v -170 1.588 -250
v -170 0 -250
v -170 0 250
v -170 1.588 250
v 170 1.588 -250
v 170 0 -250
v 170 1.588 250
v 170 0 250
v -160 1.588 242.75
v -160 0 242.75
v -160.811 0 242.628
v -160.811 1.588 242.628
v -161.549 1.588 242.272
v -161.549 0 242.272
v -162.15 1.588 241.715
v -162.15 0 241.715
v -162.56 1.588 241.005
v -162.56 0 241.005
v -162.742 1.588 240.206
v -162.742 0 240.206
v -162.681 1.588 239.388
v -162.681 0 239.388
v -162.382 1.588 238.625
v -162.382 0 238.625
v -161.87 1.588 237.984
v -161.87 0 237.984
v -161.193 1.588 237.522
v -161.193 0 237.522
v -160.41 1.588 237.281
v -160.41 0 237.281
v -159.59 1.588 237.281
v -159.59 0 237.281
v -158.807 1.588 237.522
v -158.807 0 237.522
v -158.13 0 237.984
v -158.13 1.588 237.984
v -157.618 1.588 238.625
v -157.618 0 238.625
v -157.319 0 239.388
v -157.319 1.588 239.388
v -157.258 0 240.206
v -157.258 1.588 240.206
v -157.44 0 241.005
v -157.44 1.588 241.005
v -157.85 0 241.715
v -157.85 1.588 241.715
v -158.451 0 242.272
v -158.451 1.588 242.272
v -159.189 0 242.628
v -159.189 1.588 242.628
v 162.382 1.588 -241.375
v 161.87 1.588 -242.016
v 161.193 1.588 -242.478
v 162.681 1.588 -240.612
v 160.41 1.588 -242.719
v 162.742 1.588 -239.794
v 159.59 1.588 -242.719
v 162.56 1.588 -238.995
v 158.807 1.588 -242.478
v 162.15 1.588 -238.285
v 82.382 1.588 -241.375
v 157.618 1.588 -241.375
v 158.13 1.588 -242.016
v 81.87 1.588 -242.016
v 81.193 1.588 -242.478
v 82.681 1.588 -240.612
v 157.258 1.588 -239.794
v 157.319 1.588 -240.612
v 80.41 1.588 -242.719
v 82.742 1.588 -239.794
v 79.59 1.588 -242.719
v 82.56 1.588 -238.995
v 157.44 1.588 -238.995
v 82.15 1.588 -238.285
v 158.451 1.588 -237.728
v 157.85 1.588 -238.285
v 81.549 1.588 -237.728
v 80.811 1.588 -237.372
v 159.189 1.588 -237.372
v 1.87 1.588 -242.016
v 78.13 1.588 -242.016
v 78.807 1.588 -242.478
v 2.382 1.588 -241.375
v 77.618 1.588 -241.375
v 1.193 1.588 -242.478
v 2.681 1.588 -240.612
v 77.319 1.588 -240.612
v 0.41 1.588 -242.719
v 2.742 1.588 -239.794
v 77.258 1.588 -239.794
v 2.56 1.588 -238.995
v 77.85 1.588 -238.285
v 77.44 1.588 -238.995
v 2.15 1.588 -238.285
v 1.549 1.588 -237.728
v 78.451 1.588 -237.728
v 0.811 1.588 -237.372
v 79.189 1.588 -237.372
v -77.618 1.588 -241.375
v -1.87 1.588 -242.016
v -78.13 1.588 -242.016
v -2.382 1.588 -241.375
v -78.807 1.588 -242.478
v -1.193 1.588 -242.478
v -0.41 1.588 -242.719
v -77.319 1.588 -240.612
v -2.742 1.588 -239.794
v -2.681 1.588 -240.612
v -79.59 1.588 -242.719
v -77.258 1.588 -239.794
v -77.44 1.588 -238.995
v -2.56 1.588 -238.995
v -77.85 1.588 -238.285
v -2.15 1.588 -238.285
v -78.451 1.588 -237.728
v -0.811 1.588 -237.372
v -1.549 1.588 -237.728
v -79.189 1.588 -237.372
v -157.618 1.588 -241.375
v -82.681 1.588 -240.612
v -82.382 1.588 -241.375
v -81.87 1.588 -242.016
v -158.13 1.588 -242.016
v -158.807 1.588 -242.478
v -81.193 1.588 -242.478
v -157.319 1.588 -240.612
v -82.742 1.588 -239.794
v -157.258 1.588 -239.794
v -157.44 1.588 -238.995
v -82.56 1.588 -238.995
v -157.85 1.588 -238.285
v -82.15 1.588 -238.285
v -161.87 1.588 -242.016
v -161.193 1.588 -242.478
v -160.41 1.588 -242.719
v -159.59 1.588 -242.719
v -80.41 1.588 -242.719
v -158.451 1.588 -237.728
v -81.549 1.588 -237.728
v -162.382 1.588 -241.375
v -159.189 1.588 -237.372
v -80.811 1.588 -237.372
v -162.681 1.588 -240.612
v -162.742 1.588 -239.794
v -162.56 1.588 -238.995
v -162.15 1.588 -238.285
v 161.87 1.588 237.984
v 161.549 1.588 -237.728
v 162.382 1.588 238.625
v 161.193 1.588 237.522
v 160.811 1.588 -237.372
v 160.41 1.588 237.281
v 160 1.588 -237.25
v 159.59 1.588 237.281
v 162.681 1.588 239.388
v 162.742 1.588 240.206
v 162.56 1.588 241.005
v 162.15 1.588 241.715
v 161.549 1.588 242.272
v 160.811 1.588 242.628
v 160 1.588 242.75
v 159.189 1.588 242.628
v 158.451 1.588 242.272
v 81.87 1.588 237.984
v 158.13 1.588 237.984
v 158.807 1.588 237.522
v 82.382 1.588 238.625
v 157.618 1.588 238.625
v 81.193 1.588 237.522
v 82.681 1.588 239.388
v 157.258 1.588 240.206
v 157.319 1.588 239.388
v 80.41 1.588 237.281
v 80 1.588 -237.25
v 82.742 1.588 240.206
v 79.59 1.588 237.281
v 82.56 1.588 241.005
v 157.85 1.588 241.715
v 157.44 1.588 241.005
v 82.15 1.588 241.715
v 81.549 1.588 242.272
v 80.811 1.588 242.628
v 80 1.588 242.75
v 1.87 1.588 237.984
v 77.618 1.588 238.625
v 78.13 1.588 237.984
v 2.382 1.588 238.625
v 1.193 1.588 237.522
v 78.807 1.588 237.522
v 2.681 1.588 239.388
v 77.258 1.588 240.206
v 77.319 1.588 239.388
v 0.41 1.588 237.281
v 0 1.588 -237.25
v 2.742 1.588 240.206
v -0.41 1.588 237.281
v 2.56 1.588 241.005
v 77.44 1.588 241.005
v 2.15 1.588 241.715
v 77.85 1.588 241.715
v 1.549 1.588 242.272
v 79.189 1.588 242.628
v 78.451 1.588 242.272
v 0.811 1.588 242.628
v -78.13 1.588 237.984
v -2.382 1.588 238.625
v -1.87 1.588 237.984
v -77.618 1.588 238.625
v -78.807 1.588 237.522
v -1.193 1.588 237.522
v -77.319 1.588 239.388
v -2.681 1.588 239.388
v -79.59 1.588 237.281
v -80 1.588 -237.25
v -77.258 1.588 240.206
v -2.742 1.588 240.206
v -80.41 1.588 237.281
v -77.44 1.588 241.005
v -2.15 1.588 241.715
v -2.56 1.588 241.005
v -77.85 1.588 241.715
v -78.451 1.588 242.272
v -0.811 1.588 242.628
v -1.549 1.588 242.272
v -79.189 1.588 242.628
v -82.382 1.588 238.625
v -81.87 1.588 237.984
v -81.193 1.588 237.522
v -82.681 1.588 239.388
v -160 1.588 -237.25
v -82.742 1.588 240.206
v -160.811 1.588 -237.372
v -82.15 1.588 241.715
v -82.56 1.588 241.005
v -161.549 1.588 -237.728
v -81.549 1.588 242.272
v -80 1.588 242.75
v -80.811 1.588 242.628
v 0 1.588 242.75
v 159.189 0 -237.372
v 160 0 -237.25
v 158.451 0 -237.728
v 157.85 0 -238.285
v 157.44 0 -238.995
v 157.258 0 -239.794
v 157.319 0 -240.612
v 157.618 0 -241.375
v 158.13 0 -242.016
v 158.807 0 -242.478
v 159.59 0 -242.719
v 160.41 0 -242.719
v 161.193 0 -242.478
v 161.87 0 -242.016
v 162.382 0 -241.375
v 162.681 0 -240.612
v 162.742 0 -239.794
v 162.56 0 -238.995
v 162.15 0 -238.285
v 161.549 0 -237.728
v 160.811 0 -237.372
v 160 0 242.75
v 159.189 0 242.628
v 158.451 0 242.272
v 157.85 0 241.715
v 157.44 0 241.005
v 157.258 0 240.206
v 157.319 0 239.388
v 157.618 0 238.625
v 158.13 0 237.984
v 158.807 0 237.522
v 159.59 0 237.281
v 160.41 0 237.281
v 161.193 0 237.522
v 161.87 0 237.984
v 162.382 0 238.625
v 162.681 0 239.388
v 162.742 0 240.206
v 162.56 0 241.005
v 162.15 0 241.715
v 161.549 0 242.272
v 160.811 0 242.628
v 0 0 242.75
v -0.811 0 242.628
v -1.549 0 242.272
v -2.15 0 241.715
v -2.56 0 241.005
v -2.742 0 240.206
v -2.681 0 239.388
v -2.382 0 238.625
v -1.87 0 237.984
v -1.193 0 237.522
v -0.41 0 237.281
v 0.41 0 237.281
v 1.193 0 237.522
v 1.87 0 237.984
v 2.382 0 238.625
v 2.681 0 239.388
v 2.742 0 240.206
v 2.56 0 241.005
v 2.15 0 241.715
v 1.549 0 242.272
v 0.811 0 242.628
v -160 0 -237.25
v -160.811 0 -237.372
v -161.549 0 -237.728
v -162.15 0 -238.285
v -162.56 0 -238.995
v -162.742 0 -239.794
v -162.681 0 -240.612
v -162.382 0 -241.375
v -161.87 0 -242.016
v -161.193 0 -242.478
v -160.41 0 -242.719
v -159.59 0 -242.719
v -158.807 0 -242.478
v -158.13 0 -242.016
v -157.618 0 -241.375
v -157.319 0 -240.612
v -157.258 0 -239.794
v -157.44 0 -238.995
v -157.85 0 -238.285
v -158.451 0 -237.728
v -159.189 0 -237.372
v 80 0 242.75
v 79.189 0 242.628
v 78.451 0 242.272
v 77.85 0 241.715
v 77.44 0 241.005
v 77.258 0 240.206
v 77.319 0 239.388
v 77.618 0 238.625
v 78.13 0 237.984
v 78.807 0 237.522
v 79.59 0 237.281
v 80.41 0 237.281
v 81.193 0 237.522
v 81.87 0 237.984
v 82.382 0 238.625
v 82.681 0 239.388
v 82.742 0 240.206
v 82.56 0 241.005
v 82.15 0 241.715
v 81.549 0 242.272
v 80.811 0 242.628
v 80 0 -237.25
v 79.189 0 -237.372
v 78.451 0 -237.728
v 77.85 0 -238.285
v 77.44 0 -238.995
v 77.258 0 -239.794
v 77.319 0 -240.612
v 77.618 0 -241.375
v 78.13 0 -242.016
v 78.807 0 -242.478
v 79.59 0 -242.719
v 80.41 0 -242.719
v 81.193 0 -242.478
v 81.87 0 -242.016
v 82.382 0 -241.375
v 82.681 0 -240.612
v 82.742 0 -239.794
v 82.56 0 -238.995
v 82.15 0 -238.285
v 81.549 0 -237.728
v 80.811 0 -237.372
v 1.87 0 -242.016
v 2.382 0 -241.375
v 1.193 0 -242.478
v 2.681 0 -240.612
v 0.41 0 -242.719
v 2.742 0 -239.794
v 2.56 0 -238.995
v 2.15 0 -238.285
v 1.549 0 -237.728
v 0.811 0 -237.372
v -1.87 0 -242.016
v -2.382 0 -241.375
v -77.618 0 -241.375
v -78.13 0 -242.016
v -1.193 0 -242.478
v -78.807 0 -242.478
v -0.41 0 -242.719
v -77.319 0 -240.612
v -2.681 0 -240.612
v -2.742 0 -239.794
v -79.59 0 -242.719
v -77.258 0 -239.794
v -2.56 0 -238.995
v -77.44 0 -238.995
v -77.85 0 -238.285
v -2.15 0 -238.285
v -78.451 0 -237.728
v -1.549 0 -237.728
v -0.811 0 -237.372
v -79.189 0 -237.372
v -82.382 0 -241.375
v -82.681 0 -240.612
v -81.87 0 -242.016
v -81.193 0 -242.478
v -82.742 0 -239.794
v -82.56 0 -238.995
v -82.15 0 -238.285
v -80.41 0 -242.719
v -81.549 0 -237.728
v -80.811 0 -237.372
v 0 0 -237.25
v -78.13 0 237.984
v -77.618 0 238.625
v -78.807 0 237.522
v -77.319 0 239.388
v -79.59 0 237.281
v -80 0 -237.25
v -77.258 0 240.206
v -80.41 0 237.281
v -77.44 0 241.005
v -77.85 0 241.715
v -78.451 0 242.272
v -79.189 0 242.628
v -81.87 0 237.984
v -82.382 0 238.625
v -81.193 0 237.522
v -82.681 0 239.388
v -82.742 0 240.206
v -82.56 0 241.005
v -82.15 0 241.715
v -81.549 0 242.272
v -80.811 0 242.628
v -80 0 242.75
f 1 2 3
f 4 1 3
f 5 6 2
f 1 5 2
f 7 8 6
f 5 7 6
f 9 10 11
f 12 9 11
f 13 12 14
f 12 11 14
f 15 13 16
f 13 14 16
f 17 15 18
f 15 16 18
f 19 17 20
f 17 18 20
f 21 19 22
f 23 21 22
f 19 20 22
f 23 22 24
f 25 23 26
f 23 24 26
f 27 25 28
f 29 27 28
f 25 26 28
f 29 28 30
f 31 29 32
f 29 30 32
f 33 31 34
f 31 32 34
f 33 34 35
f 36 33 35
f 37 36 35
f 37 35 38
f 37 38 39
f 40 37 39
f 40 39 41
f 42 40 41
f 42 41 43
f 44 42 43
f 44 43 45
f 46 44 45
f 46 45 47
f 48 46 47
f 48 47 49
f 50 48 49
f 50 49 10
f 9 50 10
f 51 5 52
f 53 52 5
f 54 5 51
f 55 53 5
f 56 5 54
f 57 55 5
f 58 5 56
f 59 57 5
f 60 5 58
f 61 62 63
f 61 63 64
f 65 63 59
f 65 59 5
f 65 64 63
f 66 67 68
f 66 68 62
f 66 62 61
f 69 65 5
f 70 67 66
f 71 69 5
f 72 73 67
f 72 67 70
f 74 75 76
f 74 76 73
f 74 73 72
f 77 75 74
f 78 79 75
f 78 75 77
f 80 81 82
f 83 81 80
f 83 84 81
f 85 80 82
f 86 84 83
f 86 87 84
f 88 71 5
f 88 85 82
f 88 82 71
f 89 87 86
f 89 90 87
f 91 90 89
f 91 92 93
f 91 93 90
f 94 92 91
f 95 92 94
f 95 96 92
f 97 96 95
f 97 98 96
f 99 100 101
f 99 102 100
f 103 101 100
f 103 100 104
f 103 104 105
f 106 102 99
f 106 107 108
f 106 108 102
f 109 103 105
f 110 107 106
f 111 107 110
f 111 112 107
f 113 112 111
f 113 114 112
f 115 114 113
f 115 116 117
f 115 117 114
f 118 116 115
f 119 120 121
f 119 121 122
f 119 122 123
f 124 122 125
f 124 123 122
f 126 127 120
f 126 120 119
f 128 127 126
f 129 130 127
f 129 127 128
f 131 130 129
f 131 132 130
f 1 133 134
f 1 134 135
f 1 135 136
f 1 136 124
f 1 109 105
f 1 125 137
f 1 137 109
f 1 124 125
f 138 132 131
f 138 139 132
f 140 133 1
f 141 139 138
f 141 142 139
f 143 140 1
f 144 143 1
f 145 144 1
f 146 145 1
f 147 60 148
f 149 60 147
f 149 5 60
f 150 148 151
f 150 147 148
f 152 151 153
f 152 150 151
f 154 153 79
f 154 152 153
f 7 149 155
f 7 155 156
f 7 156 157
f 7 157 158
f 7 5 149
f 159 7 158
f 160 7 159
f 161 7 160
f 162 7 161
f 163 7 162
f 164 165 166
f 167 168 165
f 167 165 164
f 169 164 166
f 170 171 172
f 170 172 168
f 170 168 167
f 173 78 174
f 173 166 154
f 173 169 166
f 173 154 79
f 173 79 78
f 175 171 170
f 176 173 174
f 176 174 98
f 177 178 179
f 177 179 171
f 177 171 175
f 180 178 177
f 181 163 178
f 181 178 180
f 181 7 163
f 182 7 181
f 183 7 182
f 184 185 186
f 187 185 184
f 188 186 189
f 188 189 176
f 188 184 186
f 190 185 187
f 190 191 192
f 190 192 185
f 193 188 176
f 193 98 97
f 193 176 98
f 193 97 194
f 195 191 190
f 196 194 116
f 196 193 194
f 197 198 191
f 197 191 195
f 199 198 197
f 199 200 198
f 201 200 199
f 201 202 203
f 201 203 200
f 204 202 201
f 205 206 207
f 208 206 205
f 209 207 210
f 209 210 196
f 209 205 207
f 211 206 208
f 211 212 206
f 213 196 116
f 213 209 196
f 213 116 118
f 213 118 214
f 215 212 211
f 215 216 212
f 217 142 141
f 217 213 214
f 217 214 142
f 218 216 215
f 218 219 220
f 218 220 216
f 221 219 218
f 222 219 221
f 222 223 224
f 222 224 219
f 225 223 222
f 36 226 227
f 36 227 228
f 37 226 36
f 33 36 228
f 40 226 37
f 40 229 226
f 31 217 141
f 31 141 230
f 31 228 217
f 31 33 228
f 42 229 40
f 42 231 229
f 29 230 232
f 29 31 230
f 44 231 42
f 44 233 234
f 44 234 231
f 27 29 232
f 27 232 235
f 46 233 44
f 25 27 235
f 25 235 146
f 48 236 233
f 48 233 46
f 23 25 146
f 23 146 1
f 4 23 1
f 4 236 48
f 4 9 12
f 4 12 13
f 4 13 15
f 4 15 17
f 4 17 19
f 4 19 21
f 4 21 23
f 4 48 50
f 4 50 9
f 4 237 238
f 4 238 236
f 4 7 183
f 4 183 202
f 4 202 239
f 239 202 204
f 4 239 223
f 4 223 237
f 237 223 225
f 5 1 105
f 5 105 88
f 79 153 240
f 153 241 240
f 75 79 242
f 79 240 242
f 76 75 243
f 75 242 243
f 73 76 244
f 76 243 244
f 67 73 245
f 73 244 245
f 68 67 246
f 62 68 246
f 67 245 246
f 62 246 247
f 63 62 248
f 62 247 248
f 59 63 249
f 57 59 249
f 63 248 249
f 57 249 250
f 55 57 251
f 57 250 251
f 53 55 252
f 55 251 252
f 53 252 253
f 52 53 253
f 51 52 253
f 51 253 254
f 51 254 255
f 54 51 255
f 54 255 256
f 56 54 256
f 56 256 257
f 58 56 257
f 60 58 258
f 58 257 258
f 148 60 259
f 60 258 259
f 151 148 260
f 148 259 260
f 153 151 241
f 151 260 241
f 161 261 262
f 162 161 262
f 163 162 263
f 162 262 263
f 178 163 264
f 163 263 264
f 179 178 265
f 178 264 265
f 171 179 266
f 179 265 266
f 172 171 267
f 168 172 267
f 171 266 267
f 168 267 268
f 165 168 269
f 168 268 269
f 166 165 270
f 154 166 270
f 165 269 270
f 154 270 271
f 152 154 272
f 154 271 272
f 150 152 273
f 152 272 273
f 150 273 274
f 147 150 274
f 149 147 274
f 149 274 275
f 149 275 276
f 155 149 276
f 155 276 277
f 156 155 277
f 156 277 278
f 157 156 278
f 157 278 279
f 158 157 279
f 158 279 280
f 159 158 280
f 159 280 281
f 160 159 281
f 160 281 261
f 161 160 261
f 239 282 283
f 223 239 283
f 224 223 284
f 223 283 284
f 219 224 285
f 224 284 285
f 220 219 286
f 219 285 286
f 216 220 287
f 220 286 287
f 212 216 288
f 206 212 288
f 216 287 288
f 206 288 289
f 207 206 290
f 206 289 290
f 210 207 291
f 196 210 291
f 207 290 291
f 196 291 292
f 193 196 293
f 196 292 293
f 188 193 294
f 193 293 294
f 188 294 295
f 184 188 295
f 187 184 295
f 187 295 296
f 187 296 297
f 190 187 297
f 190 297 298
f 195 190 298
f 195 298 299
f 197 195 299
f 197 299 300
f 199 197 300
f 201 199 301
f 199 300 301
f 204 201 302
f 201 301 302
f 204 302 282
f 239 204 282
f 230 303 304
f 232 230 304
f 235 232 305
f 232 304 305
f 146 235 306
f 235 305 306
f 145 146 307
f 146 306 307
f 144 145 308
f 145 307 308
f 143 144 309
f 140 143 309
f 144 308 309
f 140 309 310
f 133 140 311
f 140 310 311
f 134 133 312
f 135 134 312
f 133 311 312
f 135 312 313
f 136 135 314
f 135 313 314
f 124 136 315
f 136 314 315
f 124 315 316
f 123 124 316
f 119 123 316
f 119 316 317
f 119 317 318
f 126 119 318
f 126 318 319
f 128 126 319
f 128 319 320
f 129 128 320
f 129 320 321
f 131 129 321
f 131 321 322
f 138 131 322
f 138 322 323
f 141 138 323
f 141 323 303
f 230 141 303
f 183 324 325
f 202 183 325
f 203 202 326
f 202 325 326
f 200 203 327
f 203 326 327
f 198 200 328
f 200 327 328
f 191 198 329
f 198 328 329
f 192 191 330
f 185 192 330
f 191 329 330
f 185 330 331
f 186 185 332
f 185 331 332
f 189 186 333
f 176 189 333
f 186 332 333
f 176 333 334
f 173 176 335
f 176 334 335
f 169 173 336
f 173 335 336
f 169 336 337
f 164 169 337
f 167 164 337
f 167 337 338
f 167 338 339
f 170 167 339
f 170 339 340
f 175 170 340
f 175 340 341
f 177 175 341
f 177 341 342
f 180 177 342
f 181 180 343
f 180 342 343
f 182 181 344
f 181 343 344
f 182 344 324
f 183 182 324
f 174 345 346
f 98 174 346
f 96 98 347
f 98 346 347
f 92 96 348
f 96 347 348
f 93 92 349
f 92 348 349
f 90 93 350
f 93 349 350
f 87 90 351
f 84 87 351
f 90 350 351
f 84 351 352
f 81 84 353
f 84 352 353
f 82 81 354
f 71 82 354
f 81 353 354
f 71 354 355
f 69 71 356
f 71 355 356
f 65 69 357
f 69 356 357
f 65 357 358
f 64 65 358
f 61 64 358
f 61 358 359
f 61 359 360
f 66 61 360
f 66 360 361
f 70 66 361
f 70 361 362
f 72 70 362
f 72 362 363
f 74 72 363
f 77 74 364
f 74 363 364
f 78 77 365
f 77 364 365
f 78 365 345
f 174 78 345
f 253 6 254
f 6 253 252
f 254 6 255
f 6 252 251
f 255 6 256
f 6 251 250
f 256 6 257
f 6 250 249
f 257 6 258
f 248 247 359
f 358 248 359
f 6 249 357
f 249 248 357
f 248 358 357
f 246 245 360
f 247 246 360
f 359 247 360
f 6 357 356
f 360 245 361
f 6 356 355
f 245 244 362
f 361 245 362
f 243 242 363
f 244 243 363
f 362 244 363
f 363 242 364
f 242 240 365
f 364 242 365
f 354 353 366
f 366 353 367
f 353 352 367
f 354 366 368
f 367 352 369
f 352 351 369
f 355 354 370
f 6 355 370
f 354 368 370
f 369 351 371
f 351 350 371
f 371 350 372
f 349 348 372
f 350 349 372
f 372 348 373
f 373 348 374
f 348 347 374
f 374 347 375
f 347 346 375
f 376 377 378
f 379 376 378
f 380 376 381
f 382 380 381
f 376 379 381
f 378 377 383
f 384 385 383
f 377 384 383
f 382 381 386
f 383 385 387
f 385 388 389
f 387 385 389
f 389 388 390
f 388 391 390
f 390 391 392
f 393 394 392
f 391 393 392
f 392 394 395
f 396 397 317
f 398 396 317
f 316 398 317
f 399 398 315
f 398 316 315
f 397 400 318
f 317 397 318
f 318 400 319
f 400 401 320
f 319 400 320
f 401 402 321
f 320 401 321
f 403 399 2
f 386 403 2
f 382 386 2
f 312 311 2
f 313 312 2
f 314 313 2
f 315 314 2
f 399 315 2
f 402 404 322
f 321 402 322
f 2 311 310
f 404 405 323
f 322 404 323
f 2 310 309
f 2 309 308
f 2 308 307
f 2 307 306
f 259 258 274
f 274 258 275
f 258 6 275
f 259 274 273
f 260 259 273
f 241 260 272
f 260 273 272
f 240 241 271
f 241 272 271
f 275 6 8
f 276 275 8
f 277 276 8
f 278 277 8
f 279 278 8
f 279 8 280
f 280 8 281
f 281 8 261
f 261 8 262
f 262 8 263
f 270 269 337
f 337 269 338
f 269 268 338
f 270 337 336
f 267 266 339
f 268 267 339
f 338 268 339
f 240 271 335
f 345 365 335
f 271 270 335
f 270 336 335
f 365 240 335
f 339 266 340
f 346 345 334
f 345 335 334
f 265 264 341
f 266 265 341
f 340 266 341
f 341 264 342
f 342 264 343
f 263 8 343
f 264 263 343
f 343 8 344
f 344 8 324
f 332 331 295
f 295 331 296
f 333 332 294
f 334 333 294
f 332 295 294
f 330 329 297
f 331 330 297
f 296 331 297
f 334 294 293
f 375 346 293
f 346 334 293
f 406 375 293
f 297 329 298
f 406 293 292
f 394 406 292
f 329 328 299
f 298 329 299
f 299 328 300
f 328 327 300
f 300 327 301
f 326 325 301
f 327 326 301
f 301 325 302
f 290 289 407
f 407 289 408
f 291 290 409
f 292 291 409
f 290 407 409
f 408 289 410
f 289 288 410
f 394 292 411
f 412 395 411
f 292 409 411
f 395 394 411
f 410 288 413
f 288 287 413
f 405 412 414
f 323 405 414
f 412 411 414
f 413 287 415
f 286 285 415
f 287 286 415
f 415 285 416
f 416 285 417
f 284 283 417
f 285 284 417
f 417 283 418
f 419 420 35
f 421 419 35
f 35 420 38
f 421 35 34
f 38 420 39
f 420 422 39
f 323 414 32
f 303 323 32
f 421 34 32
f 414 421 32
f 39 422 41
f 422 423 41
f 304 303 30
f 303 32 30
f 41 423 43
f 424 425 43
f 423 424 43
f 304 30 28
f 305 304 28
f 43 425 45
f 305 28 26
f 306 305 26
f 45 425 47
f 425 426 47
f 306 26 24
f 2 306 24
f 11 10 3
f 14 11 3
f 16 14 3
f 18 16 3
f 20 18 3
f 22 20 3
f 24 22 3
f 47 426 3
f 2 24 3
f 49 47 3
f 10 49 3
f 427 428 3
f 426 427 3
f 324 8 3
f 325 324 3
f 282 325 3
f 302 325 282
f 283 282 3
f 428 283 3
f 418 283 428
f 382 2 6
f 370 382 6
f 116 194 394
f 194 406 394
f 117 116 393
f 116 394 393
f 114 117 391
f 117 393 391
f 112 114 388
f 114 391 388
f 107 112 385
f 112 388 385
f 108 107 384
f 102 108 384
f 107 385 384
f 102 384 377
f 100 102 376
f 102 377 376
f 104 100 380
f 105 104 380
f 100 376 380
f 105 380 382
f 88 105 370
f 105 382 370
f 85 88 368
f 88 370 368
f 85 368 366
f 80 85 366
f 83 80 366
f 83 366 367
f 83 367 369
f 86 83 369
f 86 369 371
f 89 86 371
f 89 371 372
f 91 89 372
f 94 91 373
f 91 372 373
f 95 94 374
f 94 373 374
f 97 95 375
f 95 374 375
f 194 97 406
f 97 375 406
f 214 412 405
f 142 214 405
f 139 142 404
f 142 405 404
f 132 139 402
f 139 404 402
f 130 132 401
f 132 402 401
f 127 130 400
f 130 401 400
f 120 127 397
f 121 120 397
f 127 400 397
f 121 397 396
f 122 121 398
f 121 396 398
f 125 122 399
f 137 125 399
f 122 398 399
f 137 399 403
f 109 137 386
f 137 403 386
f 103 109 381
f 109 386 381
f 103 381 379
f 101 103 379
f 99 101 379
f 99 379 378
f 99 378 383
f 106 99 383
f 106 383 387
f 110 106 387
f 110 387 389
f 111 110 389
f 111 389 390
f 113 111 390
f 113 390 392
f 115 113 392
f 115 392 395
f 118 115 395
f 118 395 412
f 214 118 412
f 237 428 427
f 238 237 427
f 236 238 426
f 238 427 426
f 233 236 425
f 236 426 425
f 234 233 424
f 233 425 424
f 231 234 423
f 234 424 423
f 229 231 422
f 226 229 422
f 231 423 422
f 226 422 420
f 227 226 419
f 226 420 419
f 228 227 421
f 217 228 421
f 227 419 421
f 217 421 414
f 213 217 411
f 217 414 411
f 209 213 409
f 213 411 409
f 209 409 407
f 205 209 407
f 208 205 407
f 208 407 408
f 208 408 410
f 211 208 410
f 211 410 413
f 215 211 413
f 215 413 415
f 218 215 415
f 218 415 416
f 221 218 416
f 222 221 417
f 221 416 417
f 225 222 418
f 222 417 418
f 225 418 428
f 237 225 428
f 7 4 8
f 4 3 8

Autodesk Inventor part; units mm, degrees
ref_plane "YZ Plane" through (0, 0, 0) normal (1, 0, 0) x (0, 1, 0)
ref_plane "XZ Plane" through (0, 0, 0) normal (0, 1, 0) x (-1, 0, 0)
ref_plane "XY Plane" through (0, 0, 0) normal (0, 0, 1) x (1, 0, 0)
sketch "Sketch1" plane through (0, 0, 0) normal (0, 1, 0) x (-1, 0, 0)
  line L0 (170, 250) -> (-170, 250)
  line L1 (-170, 250) -> (-170, -250)
  line L2 (-170, -250) -> (170, -250)
  line L3 (170, -250) -> (170, 250)
  line L4 (170, 250) -> (-170, -250) construction
  line L5 (-170, 250) -> (170, -250) construction
  point P0 (0, 0)
  dimension "d0" = 340
  dimension "d1" = 500
extrude "Extrusion1" add sketch "Sketch1" along normal blind 1.5875
sketch "Sketch2" plane through (0, 1.5875, 0) normal (0, 1, 0) x (1, 0, 0)
  line L0 (-170, -250) -> (170, -250) projected
  line L1 (170, -250) -> (170, 250) projected
  line L2 (170, 250) -> (-170, 250) projected
  line L3 (-170, 250) -> (-170, -250) projected
  point P0 (0, 0)
  point P1 (-160, -240)
  dimension "d4" = 10
  dimension "d5" = 10
hole "Hole1" at (-160, 1.5875, 240) direction (0, -1, 0) diameter 5.5 end through all clearance for "Hex Head Bolt" size "M5" standard "Ansi Metric M Profile"
pattern_linear "Rectangular Pattern1" count 2 spacing 480 along (0, 0, -1) count 5 spacing 80 along (1, 0, 0) of "Hole1"
equation "\"d1\" = depth"
equation "\"d2\" = facingGasketThickness"
equation "\"depth\" = 500"
equation "\"facingThickness\" = 12.7"
equation "\"facingGasketThickness\" = 1.5875"
properties part number "sideGasket" material "Rubber"
